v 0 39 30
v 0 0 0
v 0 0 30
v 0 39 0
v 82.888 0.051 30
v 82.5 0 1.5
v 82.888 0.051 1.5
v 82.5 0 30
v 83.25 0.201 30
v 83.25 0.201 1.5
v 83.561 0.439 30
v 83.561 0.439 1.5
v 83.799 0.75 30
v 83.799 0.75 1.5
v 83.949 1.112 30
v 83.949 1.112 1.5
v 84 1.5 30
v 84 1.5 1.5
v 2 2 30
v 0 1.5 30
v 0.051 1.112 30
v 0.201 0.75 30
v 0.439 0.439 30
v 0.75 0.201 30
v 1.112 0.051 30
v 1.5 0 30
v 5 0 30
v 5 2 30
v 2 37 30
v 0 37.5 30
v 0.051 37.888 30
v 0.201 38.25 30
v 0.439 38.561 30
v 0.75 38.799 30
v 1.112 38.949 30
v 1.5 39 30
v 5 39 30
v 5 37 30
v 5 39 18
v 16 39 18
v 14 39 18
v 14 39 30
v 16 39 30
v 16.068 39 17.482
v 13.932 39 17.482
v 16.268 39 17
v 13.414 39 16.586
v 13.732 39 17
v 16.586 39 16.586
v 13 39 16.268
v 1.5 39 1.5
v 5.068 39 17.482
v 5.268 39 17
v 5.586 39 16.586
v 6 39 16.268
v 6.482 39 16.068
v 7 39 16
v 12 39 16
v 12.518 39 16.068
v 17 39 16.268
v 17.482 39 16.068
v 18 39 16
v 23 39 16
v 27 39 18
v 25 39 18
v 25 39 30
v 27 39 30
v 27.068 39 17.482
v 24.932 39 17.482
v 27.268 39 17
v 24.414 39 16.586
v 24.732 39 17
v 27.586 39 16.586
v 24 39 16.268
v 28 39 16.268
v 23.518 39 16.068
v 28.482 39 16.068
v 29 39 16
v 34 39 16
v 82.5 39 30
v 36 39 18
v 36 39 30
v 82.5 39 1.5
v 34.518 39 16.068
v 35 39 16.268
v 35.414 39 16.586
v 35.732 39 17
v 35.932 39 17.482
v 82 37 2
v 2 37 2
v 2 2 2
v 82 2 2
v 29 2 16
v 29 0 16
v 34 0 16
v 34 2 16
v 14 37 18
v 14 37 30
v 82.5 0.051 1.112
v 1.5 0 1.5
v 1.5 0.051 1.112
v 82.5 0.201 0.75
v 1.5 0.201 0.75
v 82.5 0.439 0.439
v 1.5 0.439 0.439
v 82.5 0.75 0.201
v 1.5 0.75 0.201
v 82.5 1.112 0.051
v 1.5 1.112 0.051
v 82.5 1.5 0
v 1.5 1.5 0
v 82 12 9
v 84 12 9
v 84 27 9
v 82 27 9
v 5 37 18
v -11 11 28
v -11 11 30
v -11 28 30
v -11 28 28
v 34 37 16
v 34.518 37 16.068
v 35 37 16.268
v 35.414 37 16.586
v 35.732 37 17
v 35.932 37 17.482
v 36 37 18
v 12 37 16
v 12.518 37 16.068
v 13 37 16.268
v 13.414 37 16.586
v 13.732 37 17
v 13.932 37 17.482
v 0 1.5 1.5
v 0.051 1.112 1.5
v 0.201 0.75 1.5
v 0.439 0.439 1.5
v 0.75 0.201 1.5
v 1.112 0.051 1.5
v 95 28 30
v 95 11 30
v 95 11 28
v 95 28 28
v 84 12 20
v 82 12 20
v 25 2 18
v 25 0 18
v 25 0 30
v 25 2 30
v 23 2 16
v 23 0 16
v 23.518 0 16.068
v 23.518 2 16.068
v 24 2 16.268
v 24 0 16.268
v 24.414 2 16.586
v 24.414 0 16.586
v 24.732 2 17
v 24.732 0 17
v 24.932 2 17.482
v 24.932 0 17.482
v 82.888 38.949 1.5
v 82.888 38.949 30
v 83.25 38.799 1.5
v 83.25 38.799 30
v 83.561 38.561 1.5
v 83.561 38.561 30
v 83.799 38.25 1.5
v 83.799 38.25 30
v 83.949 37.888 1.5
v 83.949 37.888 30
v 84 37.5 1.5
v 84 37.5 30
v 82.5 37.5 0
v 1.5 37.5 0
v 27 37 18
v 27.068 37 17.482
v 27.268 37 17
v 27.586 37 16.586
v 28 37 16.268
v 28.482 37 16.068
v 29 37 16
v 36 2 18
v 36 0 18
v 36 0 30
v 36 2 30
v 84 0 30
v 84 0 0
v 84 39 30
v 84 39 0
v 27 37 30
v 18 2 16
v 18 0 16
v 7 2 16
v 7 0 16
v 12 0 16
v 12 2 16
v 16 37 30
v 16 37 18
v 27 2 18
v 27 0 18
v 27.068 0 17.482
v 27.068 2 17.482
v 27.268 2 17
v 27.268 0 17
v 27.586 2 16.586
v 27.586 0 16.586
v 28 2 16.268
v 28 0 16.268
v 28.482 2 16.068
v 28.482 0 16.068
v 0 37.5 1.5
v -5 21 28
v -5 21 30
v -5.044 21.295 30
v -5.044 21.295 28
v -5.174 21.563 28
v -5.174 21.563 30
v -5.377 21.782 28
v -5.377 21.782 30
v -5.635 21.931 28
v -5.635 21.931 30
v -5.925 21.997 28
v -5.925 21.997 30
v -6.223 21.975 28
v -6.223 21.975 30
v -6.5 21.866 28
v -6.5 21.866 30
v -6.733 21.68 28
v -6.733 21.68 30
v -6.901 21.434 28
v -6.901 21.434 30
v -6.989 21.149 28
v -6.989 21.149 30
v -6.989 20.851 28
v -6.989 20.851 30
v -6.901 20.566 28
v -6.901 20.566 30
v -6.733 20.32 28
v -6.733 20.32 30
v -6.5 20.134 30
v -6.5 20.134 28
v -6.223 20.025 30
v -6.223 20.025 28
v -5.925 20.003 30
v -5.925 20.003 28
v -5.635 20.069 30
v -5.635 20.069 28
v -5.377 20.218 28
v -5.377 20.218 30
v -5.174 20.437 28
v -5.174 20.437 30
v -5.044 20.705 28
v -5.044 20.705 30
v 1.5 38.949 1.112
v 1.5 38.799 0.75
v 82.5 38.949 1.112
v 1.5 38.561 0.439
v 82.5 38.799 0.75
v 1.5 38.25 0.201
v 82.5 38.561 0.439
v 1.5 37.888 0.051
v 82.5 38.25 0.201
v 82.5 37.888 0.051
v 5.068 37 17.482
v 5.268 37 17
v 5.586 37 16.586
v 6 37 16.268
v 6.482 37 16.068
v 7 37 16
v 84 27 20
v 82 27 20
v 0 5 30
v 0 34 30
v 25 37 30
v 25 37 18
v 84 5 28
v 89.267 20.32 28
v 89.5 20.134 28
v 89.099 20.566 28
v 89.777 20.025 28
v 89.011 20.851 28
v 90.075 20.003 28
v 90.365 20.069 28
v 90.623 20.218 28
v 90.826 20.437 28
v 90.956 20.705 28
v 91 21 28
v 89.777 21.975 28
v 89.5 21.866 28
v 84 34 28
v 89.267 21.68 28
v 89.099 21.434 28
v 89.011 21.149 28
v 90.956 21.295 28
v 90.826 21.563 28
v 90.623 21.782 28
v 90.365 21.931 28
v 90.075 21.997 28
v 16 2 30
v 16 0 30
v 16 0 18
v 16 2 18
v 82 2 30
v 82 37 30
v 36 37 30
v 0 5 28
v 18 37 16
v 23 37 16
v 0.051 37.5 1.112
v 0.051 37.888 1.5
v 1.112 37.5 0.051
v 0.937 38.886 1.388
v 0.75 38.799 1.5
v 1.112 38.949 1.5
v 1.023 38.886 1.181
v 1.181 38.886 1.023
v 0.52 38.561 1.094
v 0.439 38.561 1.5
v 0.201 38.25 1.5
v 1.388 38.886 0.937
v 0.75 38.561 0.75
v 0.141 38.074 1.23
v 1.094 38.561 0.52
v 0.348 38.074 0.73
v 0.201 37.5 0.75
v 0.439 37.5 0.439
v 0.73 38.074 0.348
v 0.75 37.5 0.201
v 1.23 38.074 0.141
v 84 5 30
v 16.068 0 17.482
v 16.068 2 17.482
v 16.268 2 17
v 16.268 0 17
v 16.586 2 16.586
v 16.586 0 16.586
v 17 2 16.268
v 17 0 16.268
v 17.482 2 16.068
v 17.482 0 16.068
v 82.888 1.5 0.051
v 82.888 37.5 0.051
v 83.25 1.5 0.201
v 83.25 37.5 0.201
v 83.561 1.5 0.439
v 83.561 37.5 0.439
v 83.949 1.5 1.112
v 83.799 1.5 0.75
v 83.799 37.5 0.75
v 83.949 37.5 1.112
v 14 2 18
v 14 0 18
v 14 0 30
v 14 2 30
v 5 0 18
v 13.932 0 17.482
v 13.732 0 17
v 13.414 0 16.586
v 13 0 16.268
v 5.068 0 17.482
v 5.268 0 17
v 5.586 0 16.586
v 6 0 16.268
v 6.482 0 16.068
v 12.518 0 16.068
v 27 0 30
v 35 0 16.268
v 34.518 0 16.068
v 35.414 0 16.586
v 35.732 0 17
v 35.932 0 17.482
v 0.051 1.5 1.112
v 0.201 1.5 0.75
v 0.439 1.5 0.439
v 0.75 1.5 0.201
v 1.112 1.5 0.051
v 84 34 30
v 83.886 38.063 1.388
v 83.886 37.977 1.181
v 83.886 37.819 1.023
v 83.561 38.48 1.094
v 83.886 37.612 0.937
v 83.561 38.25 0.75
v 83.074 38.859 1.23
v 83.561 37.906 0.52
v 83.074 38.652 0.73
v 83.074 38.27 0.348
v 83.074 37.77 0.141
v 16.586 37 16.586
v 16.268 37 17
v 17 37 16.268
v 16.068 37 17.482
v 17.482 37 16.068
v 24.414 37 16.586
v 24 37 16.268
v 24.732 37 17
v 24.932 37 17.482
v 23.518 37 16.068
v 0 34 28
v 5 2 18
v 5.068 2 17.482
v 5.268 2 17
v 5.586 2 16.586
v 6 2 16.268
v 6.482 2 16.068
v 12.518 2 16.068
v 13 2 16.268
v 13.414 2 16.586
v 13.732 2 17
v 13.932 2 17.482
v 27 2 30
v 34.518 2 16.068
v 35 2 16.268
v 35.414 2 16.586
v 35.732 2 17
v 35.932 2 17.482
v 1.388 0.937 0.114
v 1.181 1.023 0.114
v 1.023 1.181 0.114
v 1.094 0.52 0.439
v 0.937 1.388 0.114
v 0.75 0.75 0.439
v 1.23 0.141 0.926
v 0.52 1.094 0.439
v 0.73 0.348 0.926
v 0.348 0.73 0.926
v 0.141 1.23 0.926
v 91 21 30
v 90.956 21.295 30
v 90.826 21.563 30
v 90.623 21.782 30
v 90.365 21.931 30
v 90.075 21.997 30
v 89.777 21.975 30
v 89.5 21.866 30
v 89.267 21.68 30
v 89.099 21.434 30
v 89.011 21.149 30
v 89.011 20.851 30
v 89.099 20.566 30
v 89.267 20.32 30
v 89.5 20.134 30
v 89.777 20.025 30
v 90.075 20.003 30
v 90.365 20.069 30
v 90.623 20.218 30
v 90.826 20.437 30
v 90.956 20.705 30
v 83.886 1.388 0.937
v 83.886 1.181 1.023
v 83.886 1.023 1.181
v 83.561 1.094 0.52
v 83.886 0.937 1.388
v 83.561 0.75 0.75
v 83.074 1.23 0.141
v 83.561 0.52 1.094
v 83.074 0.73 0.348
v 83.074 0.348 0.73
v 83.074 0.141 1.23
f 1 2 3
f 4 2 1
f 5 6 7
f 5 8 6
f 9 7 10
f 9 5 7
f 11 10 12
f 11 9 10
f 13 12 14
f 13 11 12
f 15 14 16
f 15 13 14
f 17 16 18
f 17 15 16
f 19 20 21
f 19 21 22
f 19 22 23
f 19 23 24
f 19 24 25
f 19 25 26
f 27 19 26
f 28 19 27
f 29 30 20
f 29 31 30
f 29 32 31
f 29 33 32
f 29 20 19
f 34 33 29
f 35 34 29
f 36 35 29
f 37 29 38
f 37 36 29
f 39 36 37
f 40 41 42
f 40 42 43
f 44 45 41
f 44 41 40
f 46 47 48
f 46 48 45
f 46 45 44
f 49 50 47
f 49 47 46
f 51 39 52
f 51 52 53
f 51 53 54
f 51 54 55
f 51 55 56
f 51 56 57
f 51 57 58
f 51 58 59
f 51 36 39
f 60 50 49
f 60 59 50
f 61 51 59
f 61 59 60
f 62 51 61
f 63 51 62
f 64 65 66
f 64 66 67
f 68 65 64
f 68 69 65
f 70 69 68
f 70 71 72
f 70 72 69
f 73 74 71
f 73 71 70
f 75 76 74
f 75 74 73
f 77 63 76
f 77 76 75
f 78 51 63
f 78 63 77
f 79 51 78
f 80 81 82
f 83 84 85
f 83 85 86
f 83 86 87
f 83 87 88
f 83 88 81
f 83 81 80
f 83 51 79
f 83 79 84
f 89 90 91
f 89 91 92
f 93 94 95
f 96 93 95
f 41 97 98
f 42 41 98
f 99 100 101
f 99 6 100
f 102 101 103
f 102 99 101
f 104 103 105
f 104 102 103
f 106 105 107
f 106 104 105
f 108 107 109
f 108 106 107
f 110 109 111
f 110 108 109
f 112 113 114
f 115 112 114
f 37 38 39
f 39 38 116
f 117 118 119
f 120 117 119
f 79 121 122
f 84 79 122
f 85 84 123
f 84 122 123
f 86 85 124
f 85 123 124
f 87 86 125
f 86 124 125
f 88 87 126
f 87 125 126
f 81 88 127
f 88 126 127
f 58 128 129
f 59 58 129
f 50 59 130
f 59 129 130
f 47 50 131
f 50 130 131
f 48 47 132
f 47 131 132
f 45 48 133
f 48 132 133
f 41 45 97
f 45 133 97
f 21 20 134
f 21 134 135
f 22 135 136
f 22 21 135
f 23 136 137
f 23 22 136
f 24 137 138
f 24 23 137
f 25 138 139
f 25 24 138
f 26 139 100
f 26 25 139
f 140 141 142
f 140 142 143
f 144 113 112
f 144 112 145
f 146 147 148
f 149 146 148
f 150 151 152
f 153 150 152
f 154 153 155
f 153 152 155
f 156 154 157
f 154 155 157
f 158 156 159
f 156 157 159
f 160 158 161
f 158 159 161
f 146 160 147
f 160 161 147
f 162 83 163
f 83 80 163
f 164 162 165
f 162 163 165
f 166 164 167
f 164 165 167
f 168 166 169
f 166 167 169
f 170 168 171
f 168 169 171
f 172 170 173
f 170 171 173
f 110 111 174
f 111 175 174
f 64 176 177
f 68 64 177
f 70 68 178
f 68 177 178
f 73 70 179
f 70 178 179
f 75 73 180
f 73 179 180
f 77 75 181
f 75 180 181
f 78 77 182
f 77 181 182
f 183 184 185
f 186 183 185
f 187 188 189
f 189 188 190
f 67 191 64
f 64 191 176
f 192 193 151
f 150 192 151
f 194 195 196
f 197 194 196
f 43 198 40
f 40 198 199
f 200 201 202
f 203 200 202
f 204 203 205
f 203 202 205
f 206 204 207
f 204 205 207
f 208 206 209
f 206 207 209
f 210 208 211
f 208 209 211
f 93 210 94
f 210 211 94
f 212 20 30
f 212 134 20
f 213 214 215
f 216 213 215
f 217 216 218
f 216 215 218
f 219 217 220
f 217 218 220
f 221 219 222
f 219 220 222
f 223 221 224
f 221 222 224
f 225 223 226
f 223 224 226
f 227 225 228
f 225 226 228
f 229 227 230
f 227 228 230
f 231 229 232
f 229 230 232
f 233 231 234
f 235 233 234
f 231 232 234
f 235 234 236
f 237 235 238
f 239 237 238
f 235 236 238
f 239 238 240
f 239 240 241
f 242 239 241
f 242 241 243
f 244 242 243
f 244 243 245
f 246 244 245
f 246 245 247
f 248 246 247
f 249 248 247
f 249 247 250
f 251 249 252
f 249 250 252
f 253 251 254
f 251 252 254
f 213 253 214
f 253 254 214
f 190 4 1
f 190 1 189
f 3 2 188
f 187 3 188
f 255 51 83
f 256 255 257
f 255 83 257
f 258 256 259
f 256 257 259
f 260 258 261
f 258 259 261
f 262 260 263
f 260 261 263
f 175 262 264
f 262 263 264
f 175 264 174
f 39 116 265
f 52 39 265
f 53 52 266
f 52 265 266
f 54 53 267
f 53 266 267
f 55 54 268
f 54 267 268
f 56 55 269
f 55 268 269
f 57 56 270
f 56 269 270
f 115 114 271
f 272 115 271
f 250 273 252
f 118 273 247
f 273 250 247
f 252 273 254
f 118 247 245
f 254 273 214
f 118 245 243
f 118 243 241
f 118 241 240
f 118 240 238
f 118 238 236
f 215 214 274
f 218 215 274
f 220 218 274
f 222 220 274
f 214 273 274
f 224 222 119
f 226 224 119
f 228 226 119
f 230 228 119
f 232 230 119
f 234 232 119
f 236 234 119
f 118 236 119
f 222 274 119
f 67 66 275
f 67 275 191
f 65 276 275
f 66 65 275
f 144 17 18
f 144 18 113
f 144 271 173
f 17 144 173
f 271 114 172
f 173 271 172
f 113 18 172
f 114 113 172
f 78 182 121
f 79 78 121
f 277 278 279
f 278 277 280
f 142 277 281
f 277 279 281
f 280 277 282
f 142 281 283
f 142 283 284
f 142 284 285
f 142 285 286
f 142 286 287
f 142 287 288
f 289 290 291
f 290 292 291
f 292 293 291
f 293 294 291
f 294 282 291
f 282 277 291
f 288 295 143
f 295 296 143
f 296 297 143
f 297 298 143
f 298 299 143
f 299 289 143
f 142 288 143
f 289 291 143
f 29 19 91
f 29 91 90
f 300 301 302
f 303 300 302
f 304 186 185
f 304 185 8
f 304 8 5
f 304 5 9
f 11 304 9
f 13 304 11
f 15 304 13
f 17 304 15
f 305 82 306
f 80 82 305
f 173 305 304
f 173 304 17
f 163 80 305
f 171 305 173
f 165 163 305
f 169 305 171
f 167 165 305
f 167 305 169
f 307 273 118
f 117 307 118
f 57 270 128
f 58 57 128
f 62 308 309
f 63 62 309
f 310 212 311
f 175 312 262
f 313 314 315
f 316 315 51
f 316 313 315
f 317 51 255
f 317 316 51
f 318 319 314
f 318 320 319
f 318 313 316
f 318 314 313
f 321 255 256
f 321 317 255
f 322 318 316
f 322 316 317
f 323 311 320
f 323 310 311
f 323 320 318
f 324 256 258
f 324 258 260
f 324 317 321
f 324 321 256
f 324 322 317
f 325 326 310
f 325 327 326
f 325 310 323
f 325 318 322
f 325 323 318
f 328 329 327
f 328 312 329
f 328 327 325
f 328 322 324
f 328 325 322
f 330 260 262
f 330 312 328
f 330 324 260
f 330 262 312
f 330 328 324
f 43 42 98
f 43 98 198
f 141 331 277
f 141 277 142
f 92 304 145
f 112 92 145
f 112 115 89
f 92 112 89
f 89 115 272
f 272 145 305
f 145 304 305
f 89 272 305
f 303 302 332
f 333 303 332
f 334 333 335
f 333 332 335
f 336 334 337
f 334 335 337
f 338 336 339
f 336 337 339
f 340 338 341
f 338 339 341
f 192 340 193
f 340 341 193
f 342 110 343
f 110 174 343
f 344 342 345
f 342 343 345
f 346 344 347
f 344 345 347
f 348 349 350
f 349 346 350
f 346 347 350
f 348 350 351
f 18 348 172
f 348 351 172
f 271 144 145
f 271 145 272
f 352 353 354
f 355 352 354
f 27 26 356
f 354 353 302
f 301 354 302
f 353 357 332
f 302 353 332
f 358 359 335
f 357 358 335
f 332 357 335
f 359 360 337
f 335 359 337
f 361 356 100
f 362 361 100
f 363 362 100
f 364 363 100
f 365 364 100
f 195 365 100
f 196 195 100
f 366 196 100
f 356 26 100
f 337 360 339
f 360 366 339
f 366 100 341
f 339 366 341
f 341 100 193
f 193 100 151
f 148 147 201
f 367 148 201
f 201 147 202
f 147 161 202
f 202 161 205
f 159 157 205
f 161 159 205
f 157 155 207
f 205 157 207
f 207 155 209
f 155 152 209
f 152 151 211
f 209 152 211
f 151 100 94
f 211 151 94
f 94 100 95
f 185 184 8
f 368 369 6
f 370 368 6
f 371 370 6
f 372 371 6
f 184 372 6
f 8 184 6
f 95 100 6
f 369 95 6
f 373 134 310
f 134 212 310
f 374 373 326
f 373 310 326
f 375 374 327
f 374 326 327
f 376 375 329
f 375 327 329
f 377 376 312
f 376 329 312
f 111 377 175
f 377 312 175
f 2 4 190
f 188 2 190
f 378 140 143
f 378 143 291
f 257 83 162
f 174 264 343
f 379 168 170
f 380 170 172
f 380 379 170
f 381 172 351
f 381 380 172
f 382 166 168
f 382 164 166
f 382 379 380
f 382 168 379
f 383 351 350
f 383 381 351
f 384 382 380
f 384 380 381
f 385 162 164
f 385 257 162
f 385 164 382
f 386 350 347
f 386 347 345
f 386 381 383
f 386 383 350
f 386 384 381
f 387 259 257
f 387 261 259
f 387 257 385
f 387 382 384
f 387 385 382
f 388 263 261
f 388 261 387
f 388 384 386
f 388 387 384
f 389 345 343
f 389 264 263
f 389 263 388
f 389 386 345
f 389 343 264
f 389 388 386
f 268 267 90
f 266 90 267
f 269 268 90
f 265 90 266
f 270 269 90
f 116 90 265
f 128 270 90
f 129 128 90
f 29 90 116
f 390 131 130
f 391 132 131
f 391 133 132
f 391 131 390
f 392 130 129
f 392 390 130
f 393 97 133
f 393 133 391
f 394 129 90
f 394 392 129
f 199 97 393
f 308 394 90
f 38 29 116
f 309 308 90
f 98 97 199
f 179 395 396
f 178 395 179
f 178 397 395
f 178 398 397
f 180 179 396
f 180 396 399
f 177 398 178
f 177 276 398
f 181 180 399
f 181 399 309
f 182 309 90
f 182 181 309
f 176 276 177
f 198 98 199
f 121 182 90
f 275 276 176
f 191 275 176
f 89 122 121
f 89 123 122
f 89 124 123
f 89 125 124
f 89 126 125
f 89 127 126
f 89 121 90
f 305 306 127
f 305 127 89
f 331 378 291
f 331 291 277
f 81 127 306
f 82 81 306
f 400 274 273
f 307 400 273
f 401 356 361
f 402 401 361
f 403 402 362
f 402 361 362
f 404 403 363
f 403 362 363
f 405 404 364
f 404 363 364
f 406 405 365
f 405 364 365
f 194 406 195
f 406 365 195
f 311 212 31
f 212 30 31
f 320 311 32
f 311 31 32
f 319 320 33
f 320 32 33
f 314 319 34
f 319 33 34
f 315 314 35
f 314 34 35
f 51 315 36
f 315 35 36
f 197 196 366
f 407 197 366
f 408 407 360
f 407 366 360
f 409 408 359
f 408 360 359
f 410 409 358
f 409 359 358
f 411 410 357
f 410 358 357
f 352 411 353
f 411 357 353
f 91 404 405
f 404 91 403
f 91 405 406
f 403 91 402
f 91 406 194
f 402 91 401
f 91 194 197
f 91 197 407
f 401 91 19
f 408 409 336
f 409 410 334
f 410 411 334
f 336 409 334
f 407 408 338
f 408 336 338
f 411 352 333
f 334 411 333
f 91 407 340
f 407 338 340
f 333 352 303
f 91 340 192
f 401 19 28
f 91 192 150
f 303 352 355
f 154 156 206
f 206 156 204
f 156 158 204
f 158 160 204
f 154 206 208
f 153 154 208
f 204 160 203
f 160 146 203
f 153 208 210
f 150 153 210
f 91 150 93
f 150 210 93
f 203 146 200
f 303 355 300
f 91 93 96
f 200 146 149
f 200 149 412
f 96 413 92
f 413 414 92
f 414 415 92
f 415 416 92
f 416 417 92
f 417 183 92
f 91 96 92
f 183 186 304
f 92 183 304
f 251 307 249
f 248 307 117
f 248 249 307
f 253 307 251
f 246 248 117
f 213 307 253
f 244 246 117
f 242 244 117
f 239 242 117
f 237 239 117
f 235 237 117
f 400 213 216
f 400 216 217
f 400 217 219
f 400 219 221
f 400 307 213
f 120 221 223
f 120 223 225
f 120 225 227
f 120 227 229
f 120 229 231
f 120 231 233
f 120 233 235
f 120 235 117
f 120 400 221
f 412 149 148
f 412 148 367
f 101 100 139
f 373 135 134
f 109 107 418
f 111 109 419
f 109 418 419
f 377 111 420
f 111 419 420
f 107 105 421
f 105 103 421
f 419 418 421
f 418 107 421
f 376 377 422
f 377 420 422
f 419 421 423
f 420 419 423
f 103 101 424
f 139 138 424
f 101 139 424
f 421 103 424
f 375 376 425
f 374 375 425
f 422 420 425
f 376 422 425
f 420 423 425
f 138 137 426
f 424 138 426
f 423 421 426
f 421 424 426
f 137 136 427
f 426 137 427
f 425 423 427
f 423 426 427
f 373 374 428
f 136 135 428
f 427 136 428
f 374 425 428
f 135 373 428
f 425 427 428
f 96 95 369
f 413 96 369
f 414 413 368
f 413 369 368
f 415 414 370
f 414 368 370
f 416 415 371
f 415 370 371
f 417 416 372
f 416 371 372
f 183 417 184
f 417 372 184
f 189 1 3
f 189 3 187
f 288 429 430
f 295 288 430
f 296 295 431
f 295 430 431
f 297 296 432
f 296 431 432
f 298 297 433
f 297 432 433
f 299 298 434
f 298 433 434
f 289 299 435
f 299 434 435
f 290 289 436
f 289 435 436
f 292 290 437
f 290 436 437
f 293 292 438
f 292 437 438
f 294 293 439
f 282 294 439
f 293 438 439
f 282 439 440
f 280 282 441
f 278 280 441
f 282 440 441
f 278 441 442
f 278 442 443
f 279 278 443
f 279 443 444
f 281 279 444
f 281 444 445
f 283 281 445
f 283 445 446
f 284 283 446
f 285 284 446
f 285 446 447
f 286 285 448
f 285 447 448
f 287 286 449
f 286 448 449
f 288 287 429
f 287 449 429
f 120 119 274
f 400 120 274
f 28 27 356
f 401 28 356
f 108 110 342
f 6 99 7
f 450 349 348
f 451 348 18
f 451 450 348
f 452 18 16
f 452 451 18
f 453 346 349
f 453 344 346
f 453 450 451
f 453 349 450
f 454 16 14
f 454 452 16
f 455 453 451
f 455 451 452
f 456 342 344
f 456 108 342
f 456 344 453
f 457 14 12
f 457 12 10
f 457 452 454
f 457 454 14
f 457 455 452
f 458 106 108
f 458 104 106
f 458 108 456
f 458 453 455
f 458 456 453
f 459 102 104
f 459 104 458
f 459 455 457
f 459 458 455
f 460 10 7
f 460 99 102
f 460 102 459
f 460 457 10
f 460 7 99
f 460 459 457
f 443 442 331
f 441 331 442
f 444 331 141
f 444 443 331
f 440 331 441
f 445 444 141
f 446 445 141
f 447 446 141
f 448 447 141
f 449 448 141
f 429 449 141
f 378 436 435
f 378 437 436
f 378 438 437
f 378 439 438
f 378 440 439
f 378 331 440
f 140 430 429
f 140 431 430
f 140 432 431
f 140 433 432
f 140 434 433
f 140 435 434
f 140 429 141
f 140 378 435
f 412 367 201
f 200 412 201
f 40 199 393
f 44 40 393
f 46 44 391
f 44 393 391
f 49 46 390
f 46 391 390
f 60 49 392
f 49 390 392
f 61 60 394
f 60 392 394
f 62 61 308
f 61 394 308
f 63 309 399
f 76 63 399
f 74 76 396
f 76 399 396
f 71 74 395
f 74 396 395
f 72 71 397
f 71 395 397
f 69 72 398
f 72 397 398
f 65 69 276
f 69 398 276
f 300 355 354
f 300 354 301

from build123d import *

# Parameters (mm, degrees)
SKETCH_W         = 84
SKETCH_H         = 39
EXTRUDE001_DEPTH = 30
EXTRUDE_DEPTH    = 30
SKETCH001_W      = 80
SKETCH001_H      = 35
POCKET_DEPTH     = 28
SKETCH002_W      = 15
SKETCH002_H      = 11
POCKET001_DEPTH  = 2
POCKET002_DEPTH  = 39.001
FILLET_R         = 1.5
SKETCH004_R      = 1
EXTRUDE002_DEPTH = 2


with BuildPart() as extrude001:
    # Sketch → Extrude001 (new body)
    with BuildSketch(Plane.XY):
        with Locations((42, 19.5)):
            Rectangle(SKETCH_W, SKETCH_H)
    extrude(amount=EXTRUDE001_DEPTH)


with BuildPart() as body001:
    # Sketch → Extrude (new body)
    with BuildSketch(Plane.XY):
        with Locations((42, 19.5)):
            Rectangle(SKETCH_W, SKETCH_H)
    extrude(amount=EXTRUDE_DEPTH)

    # Sketch001 (on Face6 of BaseFeature) → Pocket (cut)
    with BuildSketch(Plane.XY.offset(30)):
        with Locations((42, 19.5)):
            Rectangle(SKETCH001_W, SKETCH001_H)
    extrude(amount=-POCKET_DEPTH, mode=Mode.SUBTRACT)

    # Sketch002 (on Face3 of Pocket) → Pocket001 (cut)
    with BuildSketch(Plane.YZ.offset(84)):
        with Locations((19.5, 14.5)):
            Rectangle(SKETCH002_W, SKETCH002_H)
    extrude(amount=-POCKET001_DEPTH, mode=Mode.SUBTRACT)

    # Sketch003 (on Face1 of Pocket001) → Pocket002 (cut, through all)
    with BuildSketch(Plane.XZ):
        with BuildLine():
            Line((5, 30), (5, 18.000001))
            ThreePointArc((5, 18.000001), (5.585786, 16.585787), (7, 16))
            Line((7, 16), (12.000001, 16))
            ThreePointArc((12.000001, 16), (13.414214, 16.585787), (14, 18))
            Line((14, 18), (14, 30))
            Line((14, 30), (5, 30))
        make_face()
        with BuildLine():
            Line((16, 30), (16, 18.000001))
            ThreePointArc((16, 18.000001), (16.585786, 16.585786), (18.000001, 16))
            Line((18.000001, 16), (23.000001, 16))
            ThreePointArc((23.000001, 16), (24.414214, 16.585787), (25, 18))
            Line((25, 18), (25, 30))
            Line((25, 30), (16, 30))
        make_face()
        with BuildLine():
            Line((27, 30), (27, 18.000001))
            ThreePointArc((27, 18.000001), (27.585786, 16.585786), (29.000001, 16))
            Line((29.000001, 16), (34.000001, 16))
            ThreePointArc((34.000001, 16), (35.414214, 16.585787), (36, 18))
            Line((36, 18), (36, 30))
            Line((36, 30), (27, 30))
        make_face()
    extrude(amount=-POCKET002_DEPTH, mode=Mode.SUBTRACT)

    # Fillet
    fillet_edges = [body001.edges().sort_by_distance(p)[0] for p in [
        (0, 0, 15),
        (42, 0, 0),
        (0, 19.5, 0),
        (0, 39, 15),
        (42, 39, 0),
        (84, 39, 15),
        (84, 19.5, 0),
        (84, 0, 15),
    ]]
    fillet(fillet_edges, radius=FILLET_R)


with BuildPart() as extrude002:
    # Sketch004 (on Face2 of Fillet) → Extrude002 (new body)
    with BuildSketch(Plane.XY.offset(30)):
        Polygon((84, 34), (84, 5), (95, 11), (95, 28), align=None)
        with Locations((90, 21)):
            Circle(SKETCH004_R, mode=Mode.SUBTRACT)
        Polygon((0, 34), (0, 5), (-11, 11), (-11, 28), align=None)
        with Locations((-6, 21)):
            Circle(SKETCH004_R, mode=Mode.SUBTRACT)
    extrude(amount=-EXTRUDE002_DEPTH)


solid = Compound([extrude001.part, body001.part, extrude002.part])
